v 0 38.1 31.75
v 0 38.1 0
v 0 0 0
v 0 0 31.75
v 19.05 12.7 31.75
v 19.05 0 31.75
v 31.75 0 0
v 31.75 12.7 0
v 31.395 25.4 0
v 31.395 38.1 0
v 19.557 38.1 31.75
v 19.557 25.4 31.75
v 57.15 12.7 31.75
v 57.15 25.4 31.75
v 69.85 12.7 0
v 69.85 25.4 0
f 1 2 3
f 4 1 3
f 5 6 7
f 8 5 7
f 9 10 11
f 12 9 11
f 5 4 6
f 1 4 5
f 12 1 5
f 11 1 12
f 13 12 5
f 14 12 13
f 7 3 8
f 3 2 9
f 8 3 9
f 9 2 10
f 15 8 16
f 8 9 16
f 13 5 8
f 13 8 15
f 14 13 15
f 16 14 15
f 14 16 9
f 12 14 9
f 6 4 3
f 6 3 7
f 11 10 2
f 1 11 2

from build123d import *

# Parameters (mm, degrees)
F1_DEPTH = 31.75
F3_DEPTH = 25.4
F5_DEPTH = 12.7
F7_DEPTH = 12.7


with BuildPart() as f1:
    # F0 (on Top) → F1 (new body)
    with BuildSketch(Plane.XY):
        Polygon((0, 38.1), (0, 0), (31.75, 0), (31.75, 12.7), (69.85, 12.7), (69.85, 25.4), (31.395252, 25.4), (31.395252, 38.1), align=None)
    extrude(amount=F1_DEPTH)

    # F2 (on face) → F3 (cut)
    with BuildSketch(Plane.XZ.offset(-12.7)):
        Polygon((69.85, 31.75), (57.15, 31.75), (69.85, 0), align=None)
    extrude(amount=-F3_DEPTH, mode=Mode.SUBTRACT)

    # F4 (on face) → F5 (cut)
    with BuildSketch(Plane.XZ):
        Polygon((31.75, 31.75), (19.05, 31.75), (31.75, 0), align=None)
    extrude(amount=-F5_DEPTH, mode=Mode.SUBTRACT)

    # F6 (on face) → F7 (cut)
    with BuildSketch(Plane(origin=(0, 38.1, 0), x_dir=(-1, 0, 0), z_dir=(0, 1, 0))):
        Polygon((-31.395252, 0), (-19.556509, 31.75), (-31.395252, 31.75), align=None)
    extrude(amount=-F7_DEPTH, mode=Mode.SUBTRACT)


solid = f1.part
